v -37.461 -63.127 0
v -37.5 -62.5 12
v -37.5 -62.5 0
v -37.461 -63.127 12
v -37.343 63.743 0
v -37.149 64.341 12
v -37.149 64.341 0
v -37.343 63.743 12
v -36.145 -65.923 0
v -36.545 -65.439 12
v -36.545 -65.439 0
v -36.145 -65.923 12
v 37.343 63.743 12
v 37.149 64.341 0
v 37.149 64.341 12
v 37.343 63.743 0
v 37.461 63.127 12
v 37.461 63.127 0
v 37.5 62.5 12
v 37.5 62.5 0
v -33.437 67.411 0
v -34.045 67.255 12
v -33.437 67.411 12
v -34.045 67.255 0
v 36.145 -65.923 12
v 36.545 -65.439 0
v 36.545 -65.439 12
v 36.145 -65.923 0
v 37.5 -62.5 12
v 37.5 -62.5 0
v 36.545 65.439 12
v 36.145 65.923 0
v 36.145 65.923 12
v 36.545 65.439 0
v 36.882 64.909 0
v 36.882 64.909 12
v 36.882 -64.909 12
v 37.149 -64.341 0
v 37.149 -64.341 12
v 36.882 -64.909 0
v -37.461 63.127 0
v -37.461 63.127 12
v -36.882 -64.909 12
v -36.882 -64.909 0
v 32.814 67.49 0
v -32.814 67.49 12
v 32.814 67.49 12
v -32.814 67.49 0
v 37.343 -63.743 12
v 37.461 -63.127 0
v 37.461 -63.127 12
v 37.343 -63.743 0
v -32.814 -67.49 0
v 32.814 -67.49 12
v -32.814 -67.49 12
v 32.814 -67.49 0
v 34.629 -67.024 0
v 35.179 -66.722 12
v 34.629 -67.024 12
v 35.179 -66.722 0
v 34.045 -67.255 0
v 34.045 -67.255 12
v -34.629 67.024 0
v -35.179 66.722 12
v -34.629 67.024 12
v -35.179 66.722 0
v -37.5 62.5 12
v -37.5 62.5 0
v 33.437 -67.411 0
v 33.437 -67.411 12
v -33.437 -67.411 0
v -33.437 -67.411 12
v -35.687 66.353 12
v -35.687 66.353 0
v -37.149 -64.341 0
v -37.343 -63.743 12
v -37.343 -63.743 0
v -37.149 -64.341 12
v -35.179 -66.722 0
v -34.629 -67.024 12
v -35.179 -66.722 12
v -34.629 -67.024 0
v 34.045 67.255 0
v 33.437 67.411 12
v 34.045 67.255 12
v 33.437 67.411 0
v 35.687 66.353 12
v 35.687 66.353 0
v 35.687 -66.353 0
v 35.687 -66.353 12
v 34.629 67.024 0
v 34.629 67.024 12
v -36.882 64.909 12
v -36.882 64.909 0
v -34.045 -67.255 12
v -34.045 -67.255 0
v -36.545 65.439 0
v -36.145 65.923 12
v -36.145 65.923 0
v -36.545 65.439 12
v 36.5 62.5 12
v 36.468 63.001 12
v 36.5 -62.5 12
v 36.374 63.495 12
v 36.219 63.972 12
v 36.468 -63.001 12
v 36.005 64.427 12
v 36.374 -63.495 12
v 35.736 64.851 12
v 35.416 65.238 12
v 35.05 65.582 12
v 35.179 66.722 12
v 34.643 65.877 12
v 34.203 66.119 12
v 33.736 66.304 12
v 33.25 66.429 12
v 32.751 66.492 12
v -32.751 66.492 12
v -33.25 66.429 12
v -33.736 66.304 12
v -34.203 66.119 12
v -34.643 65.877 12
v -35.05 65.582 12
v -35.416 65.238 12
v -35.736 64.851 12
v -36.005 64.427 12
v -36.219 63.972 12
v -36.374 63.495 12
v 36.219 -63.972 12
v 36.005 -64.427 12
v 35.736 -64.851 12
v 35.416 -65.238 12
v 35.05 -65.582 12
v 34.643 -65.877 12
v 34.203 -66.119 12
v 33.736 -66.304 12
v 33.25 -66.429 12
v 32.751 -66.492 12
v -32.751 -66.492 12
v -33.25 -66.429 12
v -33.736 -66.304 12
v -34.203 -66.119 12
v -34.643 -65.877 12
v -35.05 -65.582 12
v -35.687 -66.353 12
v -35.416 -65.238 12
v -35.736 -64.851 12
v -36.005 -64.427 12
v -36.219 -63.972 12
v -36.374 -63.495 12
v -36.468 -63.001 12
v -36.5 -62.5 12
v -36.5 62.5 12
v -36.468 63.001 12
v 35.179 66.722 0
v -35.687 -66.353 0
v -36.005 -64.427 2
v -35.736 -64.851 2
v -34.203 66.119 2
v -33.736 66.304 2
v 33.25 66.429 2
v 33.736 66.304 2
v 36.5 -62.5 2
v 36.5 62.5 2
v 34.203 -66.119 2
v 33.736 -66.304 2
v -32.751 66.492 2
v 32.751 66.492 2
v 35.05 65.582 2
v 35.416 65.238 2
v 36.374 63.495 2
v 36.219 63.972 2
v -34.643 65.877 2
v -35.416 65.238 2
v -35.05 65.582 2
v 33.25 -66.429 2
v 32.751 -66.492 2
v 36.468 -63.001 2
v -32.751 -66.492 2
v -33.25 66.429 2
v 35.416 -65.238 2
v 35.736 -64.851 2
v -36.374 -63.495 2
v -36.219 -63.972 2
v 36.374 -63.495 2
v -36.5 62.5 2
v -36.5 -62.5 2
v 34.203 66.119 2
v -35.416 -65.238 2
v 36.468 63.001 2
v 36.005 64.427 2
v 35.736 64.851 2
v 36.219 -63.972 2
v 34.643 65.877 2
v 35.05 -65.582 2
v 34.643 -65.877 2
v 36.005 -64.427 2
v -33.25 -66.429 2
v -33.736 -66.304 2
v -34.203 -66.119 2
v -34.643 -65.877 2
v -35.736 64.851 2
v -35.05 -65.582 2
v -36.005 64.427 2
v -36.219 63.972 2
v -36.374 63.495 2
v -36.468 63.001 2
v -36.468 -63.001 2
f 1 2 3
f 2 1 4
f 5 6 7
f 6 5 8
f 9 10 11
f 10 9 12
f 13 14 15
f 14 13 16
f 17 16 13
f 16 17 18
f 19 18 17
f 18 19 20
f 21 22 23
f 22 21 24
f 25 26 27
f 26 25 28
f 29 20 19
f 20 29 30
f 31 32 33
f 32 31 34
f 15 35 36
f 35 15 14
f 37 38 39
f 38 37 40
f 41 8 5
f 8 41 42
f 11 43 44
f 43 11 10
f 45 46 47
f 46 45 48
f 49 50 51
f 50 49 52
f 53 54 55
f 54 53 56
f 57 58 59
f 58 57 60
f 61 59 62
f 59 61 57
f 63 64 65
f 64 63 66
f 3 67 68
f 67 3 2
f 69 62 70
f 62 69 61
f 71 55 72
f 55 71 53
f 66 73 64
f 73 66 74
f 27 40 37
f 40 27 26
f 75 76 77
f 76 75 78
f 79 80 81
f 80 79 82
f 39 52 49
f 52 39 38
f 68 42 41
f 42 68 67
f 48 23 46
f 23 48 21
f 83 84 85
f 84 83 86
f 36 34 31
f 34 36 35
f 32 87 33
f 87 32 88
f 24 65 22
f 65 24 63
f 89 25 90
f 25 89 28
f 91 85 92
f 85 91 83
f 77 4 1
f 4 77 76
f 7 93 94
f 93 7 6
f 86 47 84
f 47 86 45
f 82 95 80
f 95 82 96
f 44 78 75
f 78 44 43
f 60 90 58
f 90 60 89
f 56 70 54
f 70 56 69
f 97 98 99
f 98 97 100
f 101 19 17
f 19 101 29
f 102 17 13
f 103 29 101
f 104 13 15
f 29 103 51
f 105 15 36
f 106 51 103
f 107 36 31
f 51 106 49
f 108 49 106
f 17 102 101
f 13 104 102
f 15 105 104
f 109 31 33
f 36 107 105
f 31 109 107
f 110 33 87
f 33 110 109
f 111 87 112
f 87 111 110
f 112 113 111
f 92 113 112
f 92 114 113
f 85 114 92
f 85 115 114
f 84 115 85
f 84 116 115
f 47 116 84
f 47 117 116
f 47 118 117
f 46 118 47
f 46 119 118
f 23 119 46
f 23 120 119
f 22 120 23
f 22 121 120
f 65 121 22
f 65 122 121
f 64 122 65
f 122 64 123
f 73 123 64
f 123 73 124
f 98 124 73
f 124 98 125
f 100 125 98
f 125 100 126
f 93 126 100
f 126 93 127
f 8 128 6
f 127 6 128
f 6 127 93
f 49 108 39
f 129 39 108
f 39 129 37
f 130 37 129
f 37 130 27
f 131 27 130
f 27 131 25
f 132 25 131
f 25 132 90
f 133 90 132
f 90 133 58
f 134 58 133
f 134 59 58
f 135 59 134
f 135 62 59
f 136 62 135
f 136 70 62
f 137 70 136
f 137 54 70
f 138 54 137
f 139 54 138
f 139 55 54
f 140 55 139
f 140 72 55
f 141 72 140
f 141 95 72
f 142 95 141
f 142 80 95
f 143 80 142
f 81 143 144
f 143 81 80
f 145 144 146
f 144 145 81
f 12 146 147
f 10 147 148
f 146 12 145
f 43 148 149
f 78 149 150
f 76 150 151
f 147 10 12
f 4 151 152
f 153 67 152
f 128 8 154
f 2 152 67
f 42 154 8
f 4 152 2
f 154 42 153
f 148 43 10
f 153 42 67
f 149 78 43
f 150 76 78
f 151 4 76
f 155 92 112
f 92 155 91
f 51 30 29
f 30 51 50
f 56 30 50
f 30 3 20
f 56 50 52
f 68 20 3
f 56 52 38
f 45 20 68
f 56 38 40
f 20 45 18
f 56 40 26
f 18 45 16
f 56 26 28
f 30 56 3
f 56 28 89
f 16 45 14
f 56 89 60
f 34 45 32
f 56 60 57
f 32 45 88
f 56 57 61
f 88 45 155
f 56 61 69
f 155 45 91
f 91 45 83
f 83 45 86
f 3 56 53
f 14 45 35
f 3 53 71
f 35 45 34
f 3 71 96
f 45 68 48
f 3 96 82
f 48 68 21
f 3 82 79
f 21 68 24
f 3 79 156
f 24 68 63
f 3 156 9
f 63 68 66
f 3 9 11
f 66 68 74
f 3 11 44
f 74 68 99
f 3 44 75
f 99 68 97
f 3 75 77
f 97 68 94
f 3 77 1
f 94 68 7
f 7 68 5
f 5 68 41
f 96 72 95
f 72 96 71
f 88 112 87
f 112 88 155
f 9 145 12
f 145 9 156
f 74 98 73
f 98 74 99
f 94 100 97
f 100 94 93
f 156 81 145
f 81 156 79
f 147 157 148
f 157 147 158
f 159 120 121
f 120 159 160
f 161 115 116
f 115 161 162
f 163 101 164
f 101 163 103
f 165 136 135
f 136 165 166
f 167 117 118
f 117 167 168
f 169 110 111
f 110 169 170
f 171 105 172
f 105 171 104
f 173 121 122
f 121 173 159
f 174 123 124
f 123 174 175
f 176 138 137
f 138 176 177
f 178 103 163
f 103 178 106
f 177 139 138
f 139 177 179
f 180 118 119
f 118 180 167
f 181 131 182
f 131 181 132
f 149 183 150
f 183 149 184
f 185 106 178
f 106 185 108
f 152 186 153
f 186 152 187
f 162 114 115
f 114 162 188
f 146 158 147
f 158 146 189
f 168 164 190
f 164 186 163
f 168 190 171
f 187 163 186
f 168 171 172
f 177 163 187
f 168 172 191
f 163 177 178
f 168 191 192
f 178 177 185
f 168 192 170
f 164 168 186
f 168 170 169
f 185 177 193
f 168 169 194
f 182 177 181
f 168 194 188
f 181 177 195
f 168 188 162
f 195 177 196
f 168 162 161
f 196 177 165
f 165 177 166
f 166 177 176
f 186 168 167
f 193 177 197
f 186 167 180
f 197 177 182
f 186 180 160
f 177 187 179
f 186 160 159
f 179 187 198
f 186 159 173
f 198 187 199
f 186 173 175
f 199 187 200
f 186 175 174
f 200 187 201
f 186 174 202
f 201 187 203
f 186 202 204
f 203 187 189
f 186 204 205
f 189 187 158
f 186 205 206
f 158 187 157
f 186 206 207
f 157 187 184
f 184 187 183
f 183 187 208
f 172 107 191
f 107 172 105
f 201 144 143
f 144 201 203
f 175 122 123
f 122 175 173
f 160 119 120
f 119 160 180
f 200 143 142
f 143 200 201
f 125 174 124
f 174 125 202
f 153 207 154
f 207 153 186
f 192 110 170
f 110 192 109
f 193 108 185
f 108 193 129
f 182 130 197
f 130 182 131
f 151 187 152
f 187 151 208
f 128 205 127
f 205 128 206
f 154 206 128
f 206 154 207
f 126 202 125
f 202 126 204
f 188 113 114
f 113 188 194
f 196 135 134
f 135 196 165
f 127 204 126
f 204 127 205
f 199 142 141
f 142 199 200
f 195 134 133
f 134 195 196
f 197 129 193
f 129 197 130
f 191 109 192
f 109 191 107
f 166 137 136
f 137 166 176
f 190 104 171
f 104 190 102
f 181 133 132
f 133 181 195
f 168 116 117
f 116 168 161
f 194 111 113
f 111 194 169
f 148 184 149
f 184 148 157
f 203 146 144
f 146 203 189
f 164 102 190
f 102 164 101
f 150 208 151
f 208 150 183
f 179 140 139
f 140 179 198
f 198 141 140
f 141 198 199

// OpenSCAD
$fn = 50;


difference() {
	union() {
		hull() {
			translate(v = [-32.5000000000, 62.5000000000, 0]) {
				cylinder(h = 12, r = 5);
			}
			translate(v = [32.5000000000, 62.5000000000, 0]) {
				cylinder(h = 12, r = 5);
			}
			translate(v = [-32.5000000000, -62.5000000000, 0]) {
				cylinder(h = 12, r = 5);
			}
			translate(v = [32.5000000000, -62.5000000000, 0]) {
				cylinder(h = 12, r = 5);
			}
		}
	}
	union() {
		translate(v = [0, 0, 2]) {
			hull() {
				translate(v = [-32.5000000000, 62.5000000000, 0]) {
					cylinder(h = 10, r = 4);
				}
				translate(v = [32.5000000000, 62.5000000000, 0]) {
					cylinder(h = 10, r = 4);
				}
				translate(v = [-32.5000000000, -62.5000000000, 0]) {
					cylinder(h = 10, r = 4);
				}
				translate(v = [32.5000000000, -62.5000000000, 0]) {
					cylinder(h = 10, r = 4);
				}
			}
		}
	}
}
